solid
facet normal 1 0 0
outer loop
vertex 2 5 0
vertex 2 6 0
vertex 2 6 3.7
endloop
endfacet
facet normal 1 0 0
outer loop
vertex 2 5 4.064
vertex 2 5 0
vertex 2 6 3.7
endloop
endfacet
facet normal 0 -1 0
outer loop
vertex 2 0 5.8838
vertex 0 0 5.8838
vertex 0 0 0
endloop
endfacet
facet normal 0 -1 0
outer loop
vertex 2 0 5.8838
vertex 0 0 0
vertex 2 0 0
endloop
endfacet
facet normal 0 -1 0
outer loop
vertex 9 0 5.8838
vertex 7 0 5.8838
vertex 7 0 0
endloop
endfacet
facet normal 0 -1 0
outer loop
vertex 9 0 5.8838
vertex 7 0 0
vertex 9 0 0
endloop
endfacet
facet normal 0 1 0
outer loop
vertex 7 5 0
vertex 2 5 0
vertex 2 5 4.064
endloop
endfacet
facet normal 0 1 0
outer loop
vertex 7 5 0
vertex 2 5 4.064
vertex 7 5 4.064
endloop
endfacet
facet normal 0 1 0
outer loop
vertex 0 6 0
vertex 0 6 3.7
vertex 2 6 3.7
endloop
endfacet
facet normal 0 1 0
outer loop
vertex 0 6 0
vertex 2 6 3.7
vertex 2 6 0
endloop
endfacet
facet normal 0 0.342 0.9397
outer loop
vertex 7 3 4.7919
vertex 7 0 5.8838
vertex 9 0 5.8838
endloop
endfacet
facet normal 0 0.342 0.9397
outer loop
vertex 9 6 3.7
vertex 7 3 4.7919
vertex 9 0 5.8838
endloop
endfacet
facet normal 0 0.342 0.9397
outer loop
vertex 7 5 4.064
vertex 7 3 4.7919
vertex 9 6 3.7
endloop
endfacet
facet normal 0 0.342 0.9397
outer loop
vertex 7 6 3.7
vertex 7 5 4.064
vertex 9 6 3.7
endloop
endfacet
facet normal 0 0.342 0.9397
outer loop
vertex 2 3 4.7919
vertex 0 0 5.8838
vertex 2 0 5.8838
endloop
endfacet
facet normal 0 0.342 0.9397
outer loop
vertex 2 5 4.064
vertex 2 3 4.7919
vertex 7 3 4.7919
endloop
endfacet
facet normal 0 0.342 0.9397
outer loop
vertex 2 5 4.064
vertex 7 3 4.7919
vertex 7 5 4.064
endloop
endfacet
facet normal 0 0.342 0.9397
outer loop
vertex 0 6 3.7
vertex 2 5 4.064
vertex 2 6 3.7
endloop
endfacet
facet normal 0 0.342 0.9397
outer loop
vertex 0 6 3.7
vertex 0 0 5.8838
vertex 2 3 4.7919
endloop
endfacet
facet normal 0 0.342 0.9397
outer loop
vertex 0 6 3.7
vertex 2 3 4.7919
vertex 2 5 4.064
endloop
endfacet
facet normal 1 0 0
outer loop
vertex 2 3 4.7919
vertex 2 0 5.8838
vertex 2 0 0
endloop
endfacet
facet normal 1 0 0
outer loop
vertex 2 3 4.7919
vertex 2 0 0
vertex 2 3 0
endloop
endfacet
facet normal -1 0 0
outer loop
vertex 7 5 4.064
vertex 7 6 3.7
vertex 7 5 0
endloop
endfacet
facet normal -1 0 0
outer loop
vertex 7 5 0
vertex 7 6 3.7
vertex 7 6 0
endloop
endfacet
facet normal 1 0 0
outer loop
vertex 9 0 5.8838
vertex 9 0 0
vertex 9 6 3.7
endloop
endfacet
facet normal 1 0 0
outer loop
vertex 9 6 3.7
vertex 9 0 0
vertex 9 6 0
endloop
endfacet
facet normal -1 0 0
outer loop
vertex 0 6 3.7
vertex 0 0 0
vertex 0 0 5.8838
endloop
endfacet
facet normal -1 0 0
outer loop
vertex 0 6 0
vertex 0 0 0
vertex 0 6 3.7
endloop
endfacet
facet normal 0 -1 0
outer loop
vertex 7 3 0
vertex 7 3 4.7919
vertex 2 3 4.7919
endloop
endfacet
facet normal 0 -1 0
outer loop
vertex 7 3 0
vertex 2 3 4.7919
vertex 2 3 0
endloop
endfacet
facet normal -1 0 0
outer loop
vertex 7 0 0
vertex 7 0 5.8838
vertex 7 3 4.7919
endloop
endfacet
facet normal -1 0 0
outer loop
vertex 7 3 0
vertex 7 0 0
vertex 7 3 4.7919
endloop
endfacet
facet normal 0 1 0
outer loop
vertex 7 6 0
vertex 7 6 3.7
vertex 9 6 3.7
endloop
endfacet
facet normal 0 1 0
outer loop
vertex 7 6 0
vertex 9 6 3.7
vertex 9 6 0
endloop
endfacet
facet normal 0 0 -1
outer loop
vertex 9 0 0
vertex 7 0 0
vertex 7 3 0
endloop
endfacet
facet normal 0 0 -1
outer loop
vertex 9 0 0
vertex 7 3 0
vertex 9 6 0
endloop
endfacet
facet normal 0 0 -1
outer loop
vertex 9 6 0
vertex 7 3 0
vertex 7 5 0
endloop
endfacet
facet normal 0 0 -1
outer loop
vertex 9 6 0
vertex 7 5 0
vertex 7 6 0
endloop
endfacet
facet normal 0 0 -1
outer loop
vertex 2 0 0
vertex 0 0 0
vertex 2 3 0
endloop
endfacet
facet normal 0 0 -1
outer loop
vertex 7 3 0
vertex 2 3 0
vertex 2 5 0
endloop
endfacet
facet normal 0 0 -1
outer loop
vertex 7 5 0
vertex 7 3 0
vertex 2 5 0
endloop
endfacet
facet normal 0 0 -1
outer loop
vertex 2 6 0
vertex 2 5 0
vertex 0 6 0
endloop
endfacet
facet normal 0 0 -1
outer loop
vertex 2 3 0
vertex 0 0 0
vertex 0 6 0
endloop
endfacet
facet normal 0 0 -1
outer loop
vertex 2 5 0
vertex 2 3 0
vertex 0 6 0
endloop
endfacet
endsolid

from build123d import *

# Parameters (mm, degrees)
SZKIC1_W                      = 2
SZKIC1_H                      = 6
DODANIE_WYCI_GNI_CIE1_DEPTH   = 6
DODANIE_WYCI_GNI_CIE1_2_DEPTH = 6
SZKIC3_W                      = 6
SZKIC3_H                      = 3
DODANIE_WYCI_GNI_CIE2_DEPTH   = 5
SFAZOWANIE2_SIZE              = 6.319198065
SFAZOWANIE2_SIZE_2            = 2.3
SZKIC5_W                      = 5
SZKIC5_H                      = 3.7
SZKIC5_H_2                    = 1.091910703
WYTNIJ_WYCI_GNI_CIE1_DEPTH    = 1


with BuildPart() as part:
    # Szkic1 → Dodanie-wyciągnięcie1 (new body)
    with BuildSketch(Plane.XY):
        with Locations((1, 3)):
            Rectangle(SZKIC1_W, SZKIC1_H)
    extrude(amount=DODANIE_WYCI_GNI_CIE1_DEPTH)



with BuildPart() as body_2:
    # Szkic1 → Dodanie-wyci_gni_cie1 2 (new body)
    with BuildSketch(Plane.XY):
        with Locations((8, 3)):
            Rectangle(SZKIC1_W, SZKIC1_H)
    extrude(amount=DODANIE_WYCI_GNI_CIE1_2_DEPTH)


with BuildPart() as part_1:
    add(part.part)

    add(body_2.part)  # Dodanie-wyciągnięcie2 merges body 2
    # Szkic3 → Dodanie-wyciągnięcie2 (add)
    with BuildSketch(Plane(origin=(2, 0, 0), x_dir=(0, 0, -1), z_dir=(1, 0, 0))):
        with Locations((-3, 4.5)):
            Rectangle(SZKIC3_W, SZKIC3_H)
    extrude(amount=DODANIE_WYCI_GNI_CIE2_DEPTH)

    # Sfazowanie2
    # the kernel refuses this chamfer: 6.319198065, 2.3 mm, written as the material it takes off along each edge
    with BuildSketch(Plane(origin=(-16.393230334, 6, 6), x_dir=(0, -0.9999130865277316, 0.013184058198645751), z_dir=(1, 0, 0))) as sfazowanie2_piece_1:
        Polygon((SFAZOWANIE2_SIZE * 0.999913086487, SFAZOWANIE2_SIZE * 0.0131840581981), (-SFAZOWANIE2_SIZE_2 * 0.0131840581986, SFAZOWANIE2_SIZE_2 * 0.999913086528), (0, 0), align=None)
    extrude(amount=41.786460667, mode=Mode.SUBTRACT)

    # Szkic5 → Wytnij-wyciągnięcie1 (cut)
    with BuildSketch(Plane(origin=(0, 6, 0), x_dir=(1, 0, 0), z_dir=(0, 1, 0))):
        with Locations((4.5, -1.85)):
            Rectangle(SZKIC5_W, SZKIC5_H)
        with Locations((4.5, -4.245955352)):
            Rectangle(SZKIC5_W, SZKIC5_H_2)
    extrude(amount=-WYTNIJ_WYCI_GNI_CIE1_DEPTH, mode=Mode.SUBTRACT)


solid = part_1.part
